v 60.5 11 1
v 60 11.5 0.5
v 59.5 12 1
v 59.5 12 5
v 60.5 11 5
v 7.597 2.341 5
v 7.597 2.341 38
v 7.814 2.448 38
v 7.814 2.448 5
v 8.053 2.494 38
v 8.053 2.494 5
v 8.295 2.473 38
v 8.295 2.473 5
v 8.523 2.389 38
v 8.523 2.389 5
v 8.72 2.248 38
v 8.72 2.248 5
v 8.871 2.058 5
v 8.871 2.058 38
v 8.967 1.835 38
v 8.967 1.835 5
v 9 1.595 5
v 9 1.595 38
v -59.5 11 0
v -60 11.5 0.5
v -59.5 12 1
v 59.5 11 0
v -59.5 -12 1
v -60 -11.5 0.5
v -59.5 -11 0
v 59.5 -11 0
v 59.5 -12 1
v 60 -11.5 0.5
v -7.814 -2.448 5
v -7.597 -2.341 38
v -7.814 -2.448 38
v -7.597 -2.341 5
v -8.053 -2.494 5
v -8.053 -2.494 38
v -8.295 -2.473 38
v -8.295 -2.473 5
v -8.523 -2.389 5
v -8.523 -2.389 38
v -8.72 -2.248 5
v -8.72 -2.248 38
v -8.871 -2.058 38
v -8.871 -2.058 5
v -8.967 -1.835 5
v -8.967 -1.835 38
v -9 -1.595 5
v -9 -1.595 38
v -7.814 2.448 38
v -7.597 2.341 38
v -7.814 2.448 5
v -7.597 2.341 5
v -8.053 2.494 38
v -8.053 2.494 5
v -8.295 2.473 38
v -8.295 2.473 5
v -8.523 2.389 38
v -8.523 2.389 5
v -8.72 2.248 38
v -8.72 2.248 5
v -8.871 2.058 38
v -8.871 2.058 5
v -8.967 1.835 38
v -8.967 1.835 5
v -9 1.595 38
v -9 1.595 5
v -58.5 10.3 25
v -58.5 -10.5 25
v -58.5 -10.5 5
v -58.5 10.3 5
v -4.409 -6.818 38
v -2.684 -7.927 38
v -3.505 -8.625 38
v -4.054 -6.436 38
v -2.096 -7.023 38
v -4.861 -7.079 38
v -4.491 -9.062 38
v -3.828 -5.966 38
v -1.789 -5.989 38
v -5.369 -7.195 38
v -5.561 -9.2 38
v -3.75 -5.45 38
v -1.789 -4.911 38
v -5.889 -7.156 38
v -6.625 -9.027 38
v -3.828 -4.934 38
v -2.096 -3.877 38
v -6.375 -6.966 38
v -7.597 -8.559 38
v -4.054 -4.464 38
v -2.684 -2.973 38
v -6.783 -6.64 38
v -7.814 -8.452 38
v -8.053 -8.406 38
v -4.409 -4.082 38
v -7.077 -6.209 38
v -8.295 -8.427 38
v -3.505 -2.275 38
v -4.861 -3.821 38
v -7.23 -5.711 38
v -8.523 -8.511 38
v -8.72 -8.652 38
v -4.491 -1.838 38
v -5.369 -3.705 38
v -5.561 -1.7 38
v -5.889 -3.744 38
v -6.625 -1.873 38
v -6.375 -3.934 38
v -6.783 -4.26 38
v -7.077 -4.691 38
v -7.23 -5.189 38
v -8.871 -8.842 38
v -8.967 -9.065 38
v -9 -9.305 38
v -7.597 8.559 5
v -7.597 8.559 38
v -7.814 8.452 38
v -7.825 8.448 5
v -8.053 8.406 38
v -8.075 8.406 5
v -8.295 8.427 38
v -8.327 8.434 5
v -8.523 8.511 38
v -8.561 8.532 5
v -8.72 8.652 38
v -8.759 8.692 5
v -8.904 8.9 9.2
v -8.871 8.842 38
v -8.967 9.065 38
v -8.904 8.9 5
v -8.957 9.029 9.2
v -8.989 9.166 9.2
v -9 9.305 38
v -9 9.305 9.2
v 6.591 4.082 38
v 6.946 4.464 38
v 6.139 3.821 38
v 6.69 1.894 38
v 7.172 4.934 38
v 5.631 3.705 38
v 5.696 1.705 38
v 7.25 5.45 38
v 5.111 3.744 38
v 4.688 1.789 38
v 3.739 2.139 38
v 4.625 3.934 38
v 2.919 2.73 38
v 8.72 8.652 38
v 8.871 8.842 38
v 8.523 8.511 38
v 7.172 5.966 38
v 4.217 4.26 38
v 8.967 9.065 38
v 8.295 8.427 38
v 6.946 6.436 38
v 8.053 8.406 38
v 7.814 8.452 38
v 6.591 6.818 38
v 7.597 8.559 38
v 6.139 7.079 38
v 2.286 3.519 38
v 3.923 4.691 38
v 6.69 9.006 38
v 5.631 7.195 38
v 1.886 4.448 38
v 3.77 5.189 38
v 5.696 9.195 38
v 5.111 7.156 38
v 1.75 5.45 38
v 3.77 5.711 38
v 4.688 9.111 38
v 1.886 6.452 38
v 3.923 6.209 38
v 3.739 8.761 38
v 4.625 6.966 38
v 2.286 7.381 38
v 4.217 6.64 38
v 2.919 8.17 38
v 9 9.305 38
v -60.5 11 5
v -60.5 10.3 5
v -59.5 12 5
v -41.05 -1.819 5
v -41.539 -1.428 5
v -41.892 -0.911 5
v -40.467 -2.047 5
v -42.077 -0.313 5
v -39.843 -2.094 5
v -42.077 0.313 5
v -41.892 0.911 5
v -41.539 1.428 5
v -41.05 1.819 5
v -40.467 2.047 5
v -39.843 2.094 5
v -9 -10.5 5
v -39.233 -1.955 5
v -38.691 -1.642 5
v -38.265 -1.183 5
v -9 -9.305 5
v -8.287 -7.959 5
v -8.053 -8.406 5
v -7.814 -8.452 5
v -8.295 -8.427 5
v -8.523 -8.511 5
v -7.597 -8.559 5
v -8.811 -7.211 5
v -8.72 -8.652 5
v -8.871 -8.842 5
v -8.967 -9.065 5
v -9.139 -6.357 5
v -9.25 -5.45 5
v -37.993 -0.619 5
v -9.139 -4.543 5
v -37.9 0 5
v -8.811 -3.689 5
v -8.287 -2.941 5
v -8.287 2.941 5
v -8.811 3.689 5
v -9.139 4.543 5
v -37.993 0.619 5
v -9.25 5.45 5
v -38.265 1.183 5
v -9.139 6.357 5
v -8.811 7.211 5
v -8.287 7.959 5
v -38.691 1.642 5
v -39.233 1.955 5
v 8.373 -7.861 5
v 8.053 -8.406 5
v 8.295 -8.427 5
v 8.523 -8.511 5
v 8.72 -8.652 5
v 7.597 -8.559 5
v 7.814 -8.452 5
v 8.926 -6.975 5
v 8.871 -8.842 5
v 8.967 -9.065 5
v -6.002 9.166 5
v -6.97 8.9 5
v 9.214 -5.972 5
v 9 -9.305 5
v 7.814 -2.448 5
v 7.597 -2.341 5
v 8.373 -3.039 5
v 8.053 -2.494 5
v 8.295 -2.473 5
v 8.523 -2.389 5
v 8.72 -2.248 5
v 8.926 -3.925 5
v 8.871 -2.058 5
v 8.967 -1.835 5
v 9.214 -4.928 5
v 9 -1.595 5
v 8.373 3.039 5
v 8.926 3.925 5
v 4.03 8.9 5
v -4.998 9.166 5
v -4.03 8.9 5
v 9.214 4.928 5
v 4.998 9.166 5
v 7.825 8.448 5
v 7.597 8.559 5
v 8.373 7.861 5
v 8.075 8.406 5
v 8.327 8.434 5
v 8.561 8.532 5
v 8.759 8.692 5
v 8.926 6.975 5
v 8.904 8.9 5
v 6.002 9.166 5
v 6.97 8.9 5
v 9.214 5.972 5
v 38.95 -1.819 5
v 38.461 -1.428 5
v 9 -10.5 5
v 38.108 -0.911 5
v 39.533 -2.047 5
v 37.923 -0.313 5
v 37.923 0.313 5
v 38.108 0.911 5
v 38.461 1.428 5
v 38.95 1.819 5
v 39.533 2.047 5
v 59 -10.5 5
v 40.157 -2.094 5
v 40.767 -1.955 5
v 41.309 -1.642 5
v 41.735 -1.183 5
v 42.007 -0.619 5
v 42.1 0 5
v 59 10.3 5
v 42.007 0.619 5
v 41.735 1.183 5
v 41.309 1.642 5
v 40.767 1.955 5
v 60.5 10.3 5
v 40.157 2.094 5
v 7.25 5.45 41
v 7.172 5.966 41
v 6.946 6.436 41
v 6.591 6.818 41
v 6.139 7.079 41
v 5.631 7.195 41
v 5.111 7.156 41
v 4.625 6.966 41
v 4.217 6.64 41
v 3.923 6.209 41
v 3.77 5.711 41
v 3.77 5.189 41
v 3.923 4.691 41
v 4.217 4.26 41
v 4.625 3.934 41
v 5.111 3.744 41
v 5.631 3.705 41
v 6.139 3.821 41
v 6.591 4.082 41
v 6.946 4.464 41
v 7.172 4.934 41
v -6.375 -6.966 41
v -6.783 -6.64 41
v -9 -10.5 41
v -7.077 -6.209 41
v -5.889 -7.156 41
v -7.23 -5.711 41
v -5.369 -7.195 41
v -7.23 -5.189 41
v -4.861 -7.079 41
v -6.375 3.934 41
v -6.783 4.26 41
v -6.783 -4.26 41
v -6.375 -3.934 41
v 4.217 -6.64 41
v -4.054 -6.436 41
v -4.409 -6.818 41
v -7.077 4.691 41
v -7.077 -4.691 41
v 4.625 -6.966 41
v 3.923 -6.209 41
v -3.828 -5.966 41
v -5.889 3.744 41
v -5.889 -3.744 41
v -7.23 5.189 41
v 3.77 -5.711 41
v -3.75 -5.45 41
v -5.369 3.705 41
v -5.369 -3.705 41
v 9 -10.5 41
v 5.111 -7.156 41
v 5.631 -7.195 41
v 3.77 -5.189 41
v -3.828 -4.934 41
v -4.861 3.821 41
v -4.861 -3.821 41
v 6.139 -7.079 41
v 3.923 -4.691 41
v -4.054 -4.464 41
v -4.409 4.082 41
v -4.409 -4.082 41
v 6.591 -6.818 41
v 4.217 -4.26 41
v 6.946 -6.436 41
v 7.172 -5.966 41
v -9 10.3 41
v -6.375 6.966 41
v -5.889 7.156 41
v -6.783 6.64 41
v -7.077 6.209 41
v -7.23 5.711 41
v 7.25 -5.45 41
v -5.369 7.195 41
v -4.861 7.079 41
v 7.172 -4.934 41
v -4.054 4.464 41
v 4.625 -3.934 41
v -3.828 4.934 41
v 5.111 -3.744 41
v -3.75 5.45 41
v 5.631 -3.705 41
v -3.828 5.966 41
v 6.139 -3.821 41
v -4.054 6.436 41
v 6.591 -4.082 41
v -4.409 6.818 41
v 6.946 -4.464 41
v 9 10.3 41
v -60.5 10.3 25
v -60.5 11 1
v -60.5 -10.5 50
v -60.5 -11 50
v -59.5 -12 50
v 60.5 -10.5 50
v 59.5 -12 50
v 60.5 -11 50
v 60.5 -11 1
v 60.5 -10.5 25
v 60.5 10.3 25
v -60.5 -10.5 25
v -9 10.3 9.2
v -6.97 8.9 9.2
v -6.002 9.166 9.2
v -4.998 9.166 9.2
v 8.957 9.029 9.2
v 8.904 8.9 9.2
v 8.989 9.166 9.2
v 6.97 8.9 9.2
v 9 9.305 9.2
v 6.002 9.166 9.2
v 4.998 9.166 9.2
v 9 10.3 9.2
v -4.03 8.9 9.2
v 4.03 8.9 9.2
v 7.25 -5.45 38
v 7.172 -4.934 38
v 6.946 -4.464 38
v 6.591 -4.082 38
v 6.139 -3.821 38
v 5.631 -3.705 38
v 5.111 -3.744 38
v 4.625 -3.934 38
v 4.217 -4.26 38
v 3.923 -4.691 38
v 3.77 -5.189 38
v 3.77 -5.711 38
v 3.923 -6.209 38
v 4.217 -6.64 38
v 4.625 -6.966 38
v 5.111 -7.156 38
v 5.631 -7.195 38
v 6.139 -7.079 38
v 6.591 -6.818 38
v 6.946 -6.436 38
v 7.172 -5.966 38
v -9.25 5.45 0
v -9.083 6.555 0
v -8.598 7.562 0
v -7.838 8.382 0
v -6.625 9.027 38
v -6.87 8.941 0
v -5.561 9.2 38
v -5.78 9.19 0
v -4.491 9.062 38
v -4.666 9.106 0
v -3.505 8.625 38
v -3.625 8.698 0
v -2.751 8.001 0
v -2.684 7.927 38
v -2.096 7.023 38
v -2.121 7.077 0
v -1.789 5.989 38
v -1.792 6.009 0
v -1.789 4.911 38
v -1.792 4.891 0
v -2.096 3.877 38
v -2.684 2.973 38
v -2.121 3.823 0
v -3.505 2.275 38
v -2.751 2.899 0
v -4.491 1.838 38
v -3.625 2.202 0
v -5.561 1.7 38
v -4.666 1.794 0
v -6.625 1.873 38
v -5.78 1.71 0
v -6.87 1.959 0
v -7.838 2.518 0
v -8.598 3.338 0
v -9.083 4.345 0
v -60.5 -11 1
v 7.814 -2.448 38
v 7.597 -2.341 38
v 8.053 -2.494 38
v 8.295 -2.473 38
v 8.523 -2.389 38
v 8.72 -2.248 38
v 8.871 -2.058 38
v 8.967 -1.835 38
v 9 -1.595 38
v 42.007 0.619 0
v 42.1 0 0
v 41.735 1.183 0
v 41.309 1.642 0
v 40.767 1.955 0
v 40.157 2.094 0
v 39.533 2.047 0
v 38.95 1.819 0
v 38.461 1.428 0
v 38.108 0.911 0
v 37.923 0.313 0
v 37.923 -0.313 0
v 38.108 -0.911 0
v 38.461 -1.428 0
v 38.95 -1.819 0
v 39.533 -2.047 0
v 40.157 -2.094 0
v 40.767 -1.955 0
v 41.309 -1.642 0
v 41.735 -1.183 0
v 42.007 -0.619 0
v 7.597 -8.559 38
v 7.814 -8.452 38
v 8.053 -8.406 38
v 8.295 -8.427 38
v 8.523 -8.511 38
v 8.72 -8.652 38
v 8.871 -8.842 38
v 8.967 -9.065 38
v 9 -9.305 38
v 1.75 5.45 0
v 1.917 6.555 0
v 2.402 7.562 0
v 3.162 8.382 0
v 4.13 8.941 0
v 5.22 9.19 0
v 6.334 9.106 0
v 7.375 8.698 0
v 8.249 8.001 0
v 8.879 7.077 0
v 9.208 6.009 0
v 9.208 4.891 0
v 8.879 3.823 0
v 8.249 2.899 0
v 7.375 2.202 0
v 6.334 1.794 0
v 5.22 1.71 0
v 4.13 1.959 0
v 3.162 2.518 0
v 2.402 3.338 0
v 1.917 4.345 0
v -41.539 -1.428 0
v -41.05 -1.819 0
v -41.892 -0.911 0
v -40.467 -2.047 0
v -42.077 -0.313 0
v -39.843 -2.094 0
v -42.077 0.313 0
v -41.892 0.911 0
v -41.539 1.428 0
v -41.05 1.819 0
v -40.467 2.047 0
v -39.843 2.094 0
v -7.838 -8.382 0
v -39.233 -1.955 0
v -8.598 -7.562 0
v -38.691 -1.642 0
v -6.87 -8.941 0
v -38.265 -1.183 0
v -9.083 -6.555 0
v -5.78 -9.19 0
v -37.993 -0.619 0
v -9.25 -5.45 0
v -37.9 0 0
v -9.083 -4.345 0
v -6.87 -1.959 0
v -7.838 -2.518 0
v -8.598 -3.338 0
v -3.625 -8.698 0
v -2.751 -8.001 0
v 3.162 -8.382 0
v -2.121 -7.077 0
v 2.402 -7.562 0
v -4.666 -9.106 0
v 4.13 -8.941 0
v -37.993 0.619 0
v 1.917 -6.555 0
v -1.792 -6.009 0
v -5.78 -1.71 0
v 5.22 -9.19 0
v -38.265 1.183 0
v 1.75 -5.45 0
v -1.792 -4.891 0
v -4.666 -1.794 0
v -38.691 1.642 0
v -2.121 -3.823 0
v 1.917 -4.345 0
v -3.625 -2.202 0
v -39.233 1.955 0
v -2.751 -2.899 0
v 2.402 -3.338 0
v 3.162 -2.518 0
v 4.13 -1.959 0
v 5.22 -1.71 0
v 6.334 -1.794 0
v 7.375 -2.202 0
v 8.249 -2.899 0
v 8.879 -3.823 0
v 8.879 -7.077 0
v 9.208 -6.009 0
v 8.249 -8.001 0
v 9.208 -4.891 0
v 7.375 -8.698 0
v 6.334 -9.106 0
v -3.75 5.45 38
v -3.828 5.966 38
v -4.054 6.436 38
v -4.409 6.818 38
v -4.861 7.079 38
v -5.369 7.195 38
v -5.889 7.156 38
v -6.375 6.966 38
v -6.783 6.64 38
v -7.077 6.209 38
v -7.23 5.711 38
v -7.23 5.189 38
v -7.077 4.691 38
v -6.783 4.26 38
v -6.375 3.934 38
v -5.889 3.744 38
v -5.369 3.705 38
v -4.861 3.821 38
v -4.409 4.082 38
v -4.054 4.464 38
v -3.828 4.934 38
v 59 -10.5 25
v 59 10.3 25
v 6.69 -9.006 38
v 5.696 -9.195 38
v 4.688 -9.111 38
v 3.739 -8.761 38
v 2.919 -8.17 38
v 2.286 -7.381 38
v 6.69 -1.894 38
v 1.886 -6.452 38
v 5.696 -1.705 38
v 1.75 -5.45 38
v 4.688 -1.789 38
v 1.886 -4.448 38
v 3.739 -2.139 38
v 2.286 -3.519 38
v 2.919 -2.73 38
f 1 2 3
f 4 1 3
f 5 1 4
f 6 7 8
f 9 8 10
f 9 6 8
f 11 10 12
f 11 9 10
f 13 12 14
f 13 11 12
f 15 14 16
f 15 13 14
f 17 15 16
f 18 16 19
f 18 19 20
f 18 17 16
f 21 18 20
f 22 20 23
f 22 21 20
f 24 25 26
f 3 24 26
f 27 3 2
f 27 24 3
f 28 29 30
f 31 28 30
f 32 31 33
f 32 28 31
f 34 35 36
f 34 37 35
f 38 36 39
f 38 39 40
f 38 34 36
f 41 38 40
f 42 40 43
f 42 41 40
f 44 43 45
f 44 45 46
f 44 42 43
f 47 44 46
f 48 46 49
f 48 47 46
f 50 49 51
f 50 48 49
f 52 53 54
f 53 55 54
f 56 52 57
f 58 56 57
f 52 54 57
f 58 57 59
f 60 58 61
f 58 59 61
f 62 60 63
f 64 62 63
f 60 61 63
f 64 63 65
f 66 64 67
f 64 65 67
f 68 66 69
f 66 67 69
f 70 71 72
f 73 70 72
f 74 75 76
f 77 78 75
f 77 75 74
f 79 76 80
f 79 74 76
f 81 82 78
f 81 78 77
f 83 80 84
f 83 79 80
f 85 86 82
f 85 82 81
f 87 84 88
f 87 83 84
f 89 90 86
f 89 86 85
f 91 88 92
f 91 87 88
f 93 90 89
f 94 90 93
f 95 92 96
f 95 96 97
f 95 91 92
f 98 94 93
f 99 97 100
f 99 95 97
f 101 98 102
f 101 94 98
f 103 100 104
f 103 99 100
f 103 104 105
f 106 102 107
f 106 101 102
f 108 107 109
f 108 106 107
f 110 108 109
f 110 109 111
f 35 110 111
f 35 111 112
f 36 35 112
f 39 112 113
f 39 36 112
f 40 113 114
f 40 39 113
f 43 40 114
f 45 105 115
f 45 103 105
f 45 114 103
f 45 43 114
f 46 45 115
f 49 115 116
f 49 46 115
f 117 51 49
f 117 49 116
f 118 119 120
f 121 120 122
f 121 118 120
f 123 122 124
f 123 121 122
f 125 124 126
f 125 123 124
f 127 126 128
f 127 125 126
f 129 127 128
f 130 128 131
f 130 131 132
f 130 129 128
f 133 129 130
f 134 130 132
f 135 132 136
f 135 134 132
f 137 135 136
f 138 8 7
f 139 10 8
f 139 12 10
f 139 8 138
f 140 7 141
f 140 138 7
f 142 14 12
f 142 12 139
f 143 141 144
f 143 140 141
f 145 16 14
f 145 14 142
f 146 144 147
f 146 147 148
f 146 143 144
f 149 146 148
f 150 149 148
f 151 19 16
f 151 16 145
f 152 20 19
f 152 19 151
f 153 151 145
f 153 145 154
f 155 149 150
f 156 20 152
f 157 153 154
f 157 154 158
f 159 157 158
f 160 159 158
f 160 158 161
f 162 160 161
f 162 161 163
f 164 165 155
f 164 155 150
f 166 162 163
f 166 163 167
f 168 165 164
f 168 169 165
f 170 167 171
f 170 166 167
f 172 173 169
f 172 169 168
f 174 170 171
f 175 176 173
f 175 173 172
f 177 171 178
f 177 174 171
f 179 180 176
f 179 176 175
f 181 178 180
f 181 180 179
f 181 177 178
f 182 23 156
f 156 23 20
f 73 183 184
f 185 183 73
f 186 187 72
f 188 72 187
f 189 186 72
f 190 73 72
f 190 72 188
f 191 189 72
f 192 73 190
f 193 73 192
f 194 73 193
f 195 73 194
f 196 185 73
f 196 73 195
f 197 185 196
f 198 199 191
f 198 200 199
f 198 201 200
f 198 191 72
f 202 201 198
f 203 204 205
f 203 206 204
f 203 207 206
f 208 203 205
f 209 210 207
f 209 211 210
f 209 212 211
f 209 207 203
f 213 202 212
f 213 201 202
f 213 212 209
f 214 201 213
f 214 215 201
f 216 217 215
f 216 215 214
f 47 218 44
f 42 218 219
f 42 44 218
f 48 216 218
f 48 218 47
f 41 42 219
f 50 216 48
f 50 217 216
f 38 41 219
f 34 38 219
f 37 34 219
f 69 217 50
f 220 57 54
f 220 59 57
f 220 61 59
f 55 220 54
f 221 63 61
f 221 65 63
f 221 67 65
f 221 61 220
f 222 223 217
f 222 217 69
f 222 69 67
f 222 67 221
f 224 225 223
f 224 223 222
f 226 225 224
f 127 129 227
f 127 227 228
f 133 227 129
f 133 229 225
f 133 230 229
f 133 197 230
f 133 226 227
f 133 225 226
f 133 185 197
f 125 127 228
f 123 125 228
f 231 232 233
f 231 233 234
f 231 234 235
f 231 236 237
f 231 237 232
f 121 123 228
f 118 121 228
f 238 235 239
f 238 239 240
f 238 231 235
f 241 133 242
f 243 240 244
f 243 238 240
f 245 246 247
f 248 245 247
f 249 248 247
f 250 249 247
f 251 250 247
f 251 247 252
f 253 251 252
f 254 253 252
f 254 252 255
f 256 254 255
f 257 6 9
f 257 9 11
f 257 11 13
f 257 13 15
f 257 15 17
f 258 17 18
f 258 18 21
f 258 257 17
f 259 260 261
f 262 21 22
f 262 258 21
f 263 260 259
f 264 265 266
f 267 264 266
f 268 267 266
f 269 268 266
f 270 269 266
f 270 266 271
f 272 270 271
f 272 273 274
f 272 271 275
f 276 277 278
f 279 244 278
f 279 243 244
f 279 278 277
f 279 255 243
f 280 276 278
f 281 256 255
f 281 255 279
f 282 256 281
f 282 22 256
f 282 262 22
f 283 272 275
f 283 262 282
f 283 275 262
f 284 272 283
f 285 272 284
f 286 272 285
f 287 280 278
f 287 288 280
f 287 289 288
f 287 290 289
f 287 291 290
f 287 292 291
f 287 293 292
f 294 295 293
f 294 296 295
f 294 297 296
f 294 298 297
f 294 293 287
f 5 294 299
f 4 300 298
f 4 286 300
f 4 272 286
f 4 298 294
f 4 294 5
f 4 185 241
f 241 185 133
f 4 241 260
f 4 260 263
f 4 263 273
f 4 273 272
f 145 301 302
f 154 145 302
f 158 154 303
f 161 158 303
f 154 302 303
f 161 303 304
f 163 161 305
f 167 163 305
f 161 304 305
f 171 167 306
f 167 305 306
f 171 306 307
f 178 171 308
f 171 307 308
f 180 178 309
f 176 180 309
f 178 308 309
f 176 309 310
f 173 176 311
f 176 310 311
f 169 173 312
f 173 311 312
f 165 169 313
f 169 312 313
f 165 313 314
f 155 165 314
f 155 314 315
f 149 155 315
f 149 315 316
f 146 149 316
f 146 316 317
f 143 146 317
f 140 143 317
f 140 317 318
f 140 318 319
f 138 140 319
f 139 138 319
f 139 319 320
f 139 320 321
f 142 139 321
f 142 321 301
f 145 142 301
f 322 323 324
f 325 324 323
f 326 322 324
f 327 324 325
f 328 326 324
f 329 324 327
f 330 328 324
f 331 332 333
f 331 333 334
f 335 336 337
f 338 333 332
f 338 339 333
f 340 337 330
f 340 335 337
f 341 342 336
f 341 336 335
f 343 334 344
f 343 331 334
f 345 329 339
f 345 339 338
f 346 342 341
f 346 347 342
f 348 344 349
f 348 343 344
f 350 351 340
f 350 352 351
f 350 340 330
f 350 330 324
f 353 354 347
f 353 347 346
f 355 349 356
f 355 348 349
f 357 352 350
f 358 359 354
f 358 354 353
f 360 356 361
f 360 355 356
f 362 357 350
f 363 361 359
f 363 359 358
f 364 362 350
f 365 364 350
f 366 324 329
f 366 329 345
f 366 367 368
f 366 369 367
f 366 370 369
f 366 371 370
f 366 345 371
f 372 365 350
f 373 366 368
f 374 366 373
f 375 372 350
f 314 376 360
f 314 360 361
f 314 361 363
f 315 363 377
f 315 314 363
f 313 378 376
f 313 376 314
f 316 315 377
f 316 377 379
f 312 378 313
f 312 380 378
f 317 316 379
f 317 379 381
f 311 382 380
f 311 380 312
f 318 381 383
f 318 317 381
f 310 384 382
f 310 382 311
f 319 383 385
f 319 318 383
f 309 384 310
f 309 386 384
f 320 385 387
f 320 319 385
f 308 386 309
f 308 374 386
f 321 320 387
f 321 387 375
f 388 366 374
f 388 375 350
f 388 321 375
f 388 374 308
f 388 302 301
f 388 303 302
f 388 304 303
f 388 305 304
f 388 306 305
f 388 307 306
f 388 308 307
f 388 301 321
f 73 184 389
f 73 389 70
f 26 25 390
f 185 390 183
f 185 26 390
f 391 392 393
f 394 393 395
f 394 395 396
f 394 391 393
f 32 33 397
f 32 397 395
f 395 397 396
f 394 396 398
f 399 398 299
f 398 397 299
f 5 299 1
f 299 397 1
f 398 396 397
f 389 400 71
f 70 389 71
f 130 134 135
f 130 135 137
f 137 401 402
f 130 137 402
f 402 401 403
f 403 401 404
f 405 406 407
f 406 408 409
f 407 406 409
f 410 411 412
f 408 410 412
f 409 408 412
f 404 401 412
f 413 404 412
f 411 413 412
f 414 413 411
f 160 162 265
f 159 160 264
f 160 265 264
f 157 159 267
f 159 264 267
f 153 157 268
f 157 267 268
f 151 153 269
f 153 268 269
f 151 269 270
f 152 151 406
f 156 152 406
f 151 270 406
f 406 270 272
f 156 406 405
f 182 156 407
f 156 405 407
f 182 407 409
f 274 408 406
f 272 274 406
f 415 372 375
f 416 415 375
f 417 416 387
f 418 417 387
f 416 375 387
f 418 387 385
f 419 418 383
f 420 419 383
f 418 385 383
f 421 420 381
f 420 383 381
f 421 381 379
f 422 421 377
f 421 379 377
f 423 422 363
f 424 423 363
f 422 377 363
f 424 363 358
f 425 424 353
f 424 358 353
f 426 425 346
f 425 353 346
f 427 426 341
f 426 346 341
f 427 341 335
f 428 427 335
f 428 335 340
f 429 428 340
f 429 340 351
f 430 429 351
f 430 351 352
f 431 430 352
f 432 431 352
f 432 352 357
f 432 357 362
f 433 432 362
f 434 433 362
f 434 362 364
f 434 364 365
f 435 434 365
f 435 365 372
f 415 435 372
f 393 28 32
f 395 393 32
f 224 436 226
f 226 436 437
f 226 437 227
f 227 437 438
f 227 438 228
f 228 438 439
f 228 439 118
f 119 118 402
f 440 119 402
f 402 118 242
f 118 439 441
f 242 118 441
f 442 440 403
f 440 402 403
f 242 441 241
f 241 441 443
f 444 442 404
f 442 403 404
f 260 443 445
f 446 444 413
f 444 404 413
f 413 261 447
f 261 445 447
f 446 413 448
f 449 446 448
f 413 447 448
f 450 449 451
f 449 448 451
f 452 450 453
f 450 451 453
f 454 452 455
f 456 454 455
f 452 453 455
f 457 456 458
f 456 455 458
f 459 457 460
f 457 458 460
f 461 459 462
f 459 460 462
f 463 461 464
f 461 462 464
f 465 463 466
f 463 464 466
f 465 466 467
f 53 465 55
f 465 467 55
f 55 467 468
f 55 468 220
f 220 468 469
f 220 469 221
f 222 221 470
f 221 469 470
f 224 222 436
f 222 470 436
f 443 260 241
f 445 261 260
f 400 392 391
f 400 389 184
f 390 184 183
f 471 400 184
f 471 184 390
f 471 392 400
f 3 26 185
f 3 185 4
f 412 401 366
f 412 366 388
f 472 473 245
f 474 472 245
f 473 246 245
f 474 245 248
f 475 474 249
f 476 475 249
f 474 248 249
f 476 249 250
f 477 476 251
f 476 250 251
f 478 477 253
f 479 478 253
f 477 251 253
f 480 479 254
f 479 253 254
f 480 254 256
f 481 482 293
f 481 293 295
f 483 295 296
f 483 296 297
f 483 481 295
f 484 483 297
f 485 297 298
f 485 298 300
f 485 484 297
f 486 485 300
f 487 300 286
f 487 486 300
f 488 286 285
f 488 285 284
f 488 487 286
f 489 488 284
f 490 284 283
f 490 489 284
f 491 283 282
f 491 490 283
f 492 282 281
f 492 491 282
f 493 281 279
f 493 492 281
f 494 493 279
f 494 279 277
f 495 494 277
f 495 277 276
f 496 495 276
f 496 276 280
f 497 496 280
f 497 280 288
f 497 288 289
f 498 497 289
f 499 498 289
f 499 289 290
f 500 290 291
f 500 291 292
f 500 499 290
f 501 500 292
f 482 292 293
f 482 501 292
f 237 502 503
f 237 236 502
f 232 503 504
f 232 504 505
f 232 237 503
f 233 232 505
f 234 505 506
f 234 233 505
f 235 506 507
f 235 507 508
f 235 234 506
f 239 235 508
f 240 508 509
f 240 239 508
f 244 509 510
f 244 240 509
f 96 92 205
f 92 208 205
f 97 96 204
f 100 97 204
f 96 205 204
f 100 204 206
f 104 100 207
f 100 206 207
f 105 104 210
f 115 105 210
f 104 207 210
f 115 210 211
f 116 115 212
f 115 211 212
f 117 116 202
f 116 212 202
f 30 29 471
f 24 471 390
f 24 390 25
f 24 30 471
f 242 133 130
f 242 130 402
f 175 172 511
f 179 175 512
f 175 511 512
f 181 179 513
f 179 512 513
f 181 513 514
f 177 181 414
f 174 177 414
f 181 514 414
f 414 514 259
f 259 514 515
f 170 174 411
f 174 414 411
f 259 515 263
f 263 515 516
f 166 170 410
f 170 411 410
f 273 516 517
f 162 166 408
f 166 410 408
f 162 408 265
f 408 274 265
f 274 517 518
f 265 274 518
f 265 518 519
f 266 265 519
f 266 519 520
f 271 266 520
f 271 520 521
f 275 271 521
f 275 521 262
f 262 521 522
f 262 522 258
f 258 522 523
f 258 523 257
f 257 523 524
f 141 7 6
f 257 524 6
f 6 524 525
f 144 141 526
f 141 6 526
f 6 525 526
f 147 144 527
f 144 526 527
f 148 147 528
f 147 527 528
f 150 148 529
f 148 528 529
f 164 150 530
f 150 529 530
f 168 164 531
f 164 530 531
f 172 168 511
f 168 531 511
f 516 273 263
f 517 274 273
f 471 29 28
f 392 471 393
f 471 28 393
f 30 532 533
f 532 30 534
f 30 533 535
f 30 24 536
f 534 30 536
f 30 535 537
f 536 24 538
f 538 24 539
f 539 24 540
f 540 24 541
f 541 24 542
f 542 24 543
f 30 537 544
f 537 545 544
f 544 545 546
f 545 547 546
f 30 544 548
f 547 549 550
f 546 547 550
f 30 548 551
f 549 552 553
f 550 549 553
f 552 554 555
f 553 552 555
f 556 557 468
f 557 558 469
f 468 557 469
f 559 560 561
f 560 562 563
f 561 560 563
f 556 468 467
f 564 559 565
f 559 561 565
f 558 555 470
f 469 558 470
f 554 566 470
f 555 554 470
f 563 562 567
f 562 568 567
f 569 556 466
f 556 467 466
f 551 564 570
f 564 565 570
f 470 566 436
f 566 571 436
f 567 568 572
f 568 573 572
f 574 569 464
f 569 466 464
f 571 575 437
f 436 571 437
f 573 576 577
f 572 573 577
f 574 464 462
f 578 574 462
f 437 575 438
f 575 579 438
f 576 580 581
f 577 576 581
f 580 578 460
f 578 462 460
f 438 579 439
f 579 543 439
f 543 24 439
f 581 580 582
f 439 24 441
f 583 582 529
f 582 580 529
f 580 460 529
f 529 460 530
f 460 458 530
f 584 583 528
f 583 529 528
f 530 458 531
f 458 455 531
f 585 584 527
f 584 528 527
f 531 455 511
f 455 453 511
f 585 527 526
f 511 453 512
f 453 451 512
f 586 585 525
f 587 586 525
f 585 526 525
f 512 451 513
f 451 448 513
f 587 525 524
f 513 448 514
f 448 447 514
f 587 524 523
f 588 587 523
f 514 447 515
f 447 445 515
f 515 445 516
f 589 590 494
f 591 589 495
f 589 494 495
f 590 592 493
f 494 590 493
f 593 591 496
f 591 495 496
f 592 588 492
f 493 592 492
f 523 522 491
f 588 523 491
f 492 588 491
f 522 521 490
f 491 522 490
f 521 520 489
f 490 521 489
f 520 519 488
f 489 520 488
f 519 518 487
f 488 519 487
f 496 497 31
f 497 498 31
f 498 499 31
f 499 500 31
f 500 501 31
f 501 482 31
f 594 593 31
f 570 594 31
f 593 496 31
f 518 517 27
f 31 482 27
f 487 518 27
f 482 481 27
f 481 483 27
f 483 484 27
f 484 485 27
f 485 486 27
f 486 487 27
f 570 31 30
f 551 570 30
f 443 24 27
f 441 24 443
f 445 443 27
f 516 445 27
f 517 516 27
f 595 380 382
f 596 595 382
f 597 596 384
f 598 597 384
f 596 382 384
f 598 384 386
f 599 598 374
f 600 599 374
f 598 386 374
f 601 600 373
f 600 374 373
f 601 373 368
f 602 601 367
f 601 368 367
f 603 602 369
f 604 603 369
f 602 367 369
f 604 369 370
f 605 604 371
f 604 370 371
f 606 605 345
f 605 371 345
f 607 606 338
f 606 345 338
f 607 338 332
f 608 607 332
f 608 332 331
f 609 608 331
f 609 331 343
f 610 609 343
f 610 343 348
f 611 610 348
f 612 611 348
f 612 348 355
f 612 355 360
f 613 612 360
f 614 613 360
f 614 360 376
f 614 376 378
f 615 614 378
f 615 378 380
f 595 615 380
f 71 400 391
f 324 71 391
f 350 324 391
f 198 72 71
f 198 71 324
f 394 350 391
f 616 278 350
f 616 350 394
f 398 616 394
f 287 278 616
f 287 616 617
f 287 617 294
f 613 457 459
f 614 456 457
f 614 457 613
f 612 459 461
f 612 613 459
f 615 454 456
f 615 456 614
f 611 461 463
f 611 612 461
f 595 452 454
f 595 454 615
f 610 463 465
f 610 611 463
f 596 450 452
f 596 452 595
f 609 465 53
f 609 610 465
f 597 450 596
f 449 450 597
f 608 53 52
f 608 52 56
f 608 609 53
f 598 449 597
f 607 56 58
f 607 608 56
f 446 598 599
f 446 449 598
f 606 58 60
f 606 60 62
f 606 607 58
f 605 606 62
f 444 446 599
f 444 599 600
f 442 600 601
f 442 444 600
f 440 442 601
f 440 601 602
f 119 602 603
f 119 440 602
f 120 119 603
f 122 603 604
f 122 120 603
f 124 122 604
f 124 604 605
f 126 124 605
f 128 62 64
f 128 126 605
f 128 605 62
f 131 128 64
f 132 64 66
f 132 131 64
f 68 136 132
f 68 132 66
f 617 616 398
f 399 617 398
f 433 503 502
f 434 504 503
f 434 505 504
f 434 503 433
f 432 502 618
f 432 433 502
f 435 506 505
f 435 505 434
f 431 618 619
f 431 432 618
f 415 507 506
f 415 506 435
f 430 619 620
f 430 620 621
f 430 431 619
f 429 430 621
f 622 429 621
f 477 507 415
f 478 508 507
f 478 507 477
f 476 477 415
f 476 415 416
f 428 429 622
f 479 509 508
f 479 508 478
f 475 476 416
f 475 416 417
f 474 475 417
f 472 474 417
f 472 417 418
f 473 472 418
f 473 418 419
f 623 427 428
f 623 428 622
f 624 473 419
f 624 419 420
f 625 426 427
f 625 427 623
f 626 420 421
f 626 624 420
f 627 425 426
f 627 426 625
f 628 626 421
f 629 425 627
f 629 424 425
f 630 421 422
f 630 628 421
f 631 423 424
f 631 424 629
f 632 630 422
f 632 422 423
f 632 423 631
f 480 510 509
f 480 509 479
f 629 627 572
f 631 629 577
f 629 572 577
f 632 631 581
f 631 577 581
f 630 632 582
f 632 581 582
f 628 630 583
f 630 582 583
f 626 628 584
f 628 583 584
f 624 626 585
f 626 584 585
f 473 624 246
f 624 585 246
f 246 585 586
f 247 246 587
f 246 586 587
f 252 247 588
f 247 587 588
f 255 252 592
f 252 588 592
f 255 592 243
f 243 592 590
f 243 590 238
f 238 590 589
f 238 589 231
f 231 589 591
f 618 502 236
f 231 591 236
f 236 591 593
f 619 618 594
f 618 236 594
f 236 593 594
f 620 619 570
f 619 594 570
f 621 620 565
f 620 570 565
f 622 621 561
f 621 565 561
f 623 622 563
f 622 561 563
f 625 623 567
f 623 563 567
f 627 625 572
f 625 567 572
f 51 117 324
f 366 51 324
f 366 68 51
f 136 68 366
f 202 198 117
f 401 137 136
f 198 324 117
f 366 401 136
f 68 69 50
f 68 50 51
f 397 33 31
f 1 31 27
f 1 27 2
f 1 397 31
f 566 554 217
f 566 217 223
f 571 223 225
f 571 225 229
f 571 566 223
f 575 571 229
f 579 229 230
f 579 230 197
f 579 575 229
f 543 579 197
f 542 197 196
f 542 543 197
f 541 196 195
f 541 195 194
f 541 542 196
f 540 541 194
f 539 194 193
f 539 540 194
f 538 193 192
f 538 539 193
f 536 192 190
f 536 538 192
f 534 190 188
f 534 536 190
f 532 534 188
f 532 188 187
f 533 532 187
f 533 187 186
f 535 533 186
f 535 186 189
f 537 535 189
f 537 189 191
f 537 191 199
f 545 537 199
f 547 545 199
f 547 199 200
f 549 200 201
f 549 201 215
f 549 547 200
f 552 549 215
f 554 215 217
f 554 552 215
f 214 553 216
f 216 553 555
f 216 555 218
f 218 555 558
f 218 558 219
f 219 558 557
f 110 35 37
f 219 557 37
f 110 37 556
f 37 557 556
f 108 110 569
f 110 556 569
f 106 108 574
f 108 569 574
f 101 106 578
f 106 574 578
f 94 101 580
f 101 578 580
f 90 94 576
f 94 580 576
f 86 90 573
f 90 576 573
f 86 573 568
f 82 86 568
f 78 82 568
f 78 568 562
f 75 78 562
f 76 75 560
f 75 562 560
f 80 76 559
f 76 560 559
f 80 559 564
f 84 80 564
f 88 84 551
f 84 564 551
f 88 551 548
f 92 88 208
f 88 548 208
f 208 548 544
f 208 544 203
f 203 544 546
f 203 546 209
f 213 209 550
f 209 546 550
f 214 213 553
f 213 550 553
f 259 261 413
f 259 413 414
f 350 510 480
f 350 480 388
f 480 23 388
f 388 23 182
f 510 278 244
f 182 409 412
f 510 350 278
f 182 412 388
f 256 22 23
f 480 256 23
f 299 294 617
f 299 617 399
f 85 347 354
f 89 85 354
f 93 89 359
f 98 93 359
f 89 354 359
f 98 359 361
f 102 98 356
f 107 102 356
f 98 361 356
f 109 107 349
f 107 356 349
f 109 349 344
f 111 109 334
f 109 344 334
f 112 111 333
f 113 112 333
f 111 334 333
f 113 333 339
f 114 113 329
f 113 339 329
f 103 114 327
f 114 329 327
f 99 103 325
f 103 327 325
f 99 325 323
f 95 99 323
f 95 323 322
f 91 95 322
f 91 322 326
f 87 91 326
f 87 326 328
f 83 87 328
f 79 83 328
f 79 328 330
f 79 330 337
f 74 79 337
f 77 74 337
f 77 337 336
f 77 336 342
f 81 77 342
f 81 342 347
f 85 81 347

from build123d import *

# Parameters (mm, degrees)
SZKIC1_W                    = 121
SZKIC1_H                    = 24
SZKIC1_R                    = 2.1
DODANIE_WYCI_GNI_CIE1_DEPTH = 5
SZKIC2_W                    = 18
SZKIC2_H                    = 21
DODANIE_WYCI_GNI_CIE2_DEPTH = 36
WYTNIJ_WYCI_GNI_CIE1_REACH  = 76.062
SZKIC3_R                    = 1.75
SZKIC4_R                    = 3.75
WYTNIJ_WYCI_GNI_CIE2_DEPTH  = 38
ZAOKR_GLENIE1_R             = 0.9
SZKIC5_W                    = 121
SZKIC5_H                    = 1.5
DODANIE_WYCI_GNI_CIE3_DEPTH = 45
SZKIC6_W                    = 18
SZKIC6_H                    = 36
WYTNIJ_WYCI_GNI_CIE3_DEPTH  = 0.2
SZKIC7_W                    = 18
SZKIC7_H                    = 4.2
WYTNIJ_WYCI_GNI_CIE4_DEPTH  = 1.4
SZKIC8_W                    = 2
SZKIC8_H                    = 20
SZKIC8_W_2                  = 1.5
DODANIE_WYCI_GNI_CIE4_DEPTH = 20.8
SFAZOWANIE1_SIZE            = 1
SFAZOWANIE2_SIZE            = 1


with BuildPart() as part:
    # Szkic1 → Dodanie-wyciągnięcie1 (new body)
    with BuildSketch(Plane.XY):
        Rectangle(SZKIC1_W, SZKIC1_H)
        with Locations((-40, 0)):
            Circle(SZKIC1_R, mode=Mode.SUBTRACT)
        with Locations((40, 0)):
            Circle(SZKIC1_R, mode=Mode.SUBTRACT)
    extrude(amount=DODANIE_WYCI_GNI_CIE1_DEPTH)

    # Szkic2 → Dodanie-wyciągnięcie2 (add)
    with BuildSketch(Plane.XY.offset(5)):
        Rectangle(SZKIC2_W, SZKIC2_H)
    extrude(amount=DODANIE_WYCI_GNI_CIE2_DEPTH)

    # Szkic3 → Wytnij-wyciągnięcie1 (cut, up to next)
    with BuildSketch(Plane.XY.offset(41), mode=Mode.PRIVATE) as wytnij_wyci_gni_cie1_sk1:
        with Locations((-5.5, 5.45)):
            Circle(SZKIC3_R)
    wytnij_wyci_gni_cie1_tool1 = extrude(wytnij_wyci_gni_cie1_sk1.sketch, amount=-WYTNIJ_WYCI_GNI_CIE1_REACH, mode=Mode.PRIVATE) & part.part
    # Szkic3 → Wytnij-wyciągnięcie1 (cut, up to next)
    with BuildSketch(Plane.XY.offset(41), mode=Mode.PRIVATE) as wytnij_wyci_gni_cie1_sk2:
        with Locations((-5.5, -5.45)):
            Circle(SZKIC3_R)
    wytnij_wyci_gni_cie1_tool2 = extrude(wytnij_wyci_gni_cie1_sk2.sketch, amount=-WYTNIJ_WYCI_GNI_CIE1_REACH, mode=Mode.PRIVATE) & part.part
    # Szkic3 → Wytnij-wyciągnięcie1 (cut, up to next)
    with BuildSketch(Plane.XY.offset(41), mode=Mode.PRIVATE) as wytnij_wyci_gni_cie1_sk3:
        with Locations((5.5, -5.45)):
            Circle(SZKIC3_R)
    wytnij_wyci_gni_cie1_tool3 = extrude(wytnij_wyci_gni_cie1_sk3.sketch, amount=-WYTNIJ_WYCI_GNI_CIE1_REACH, mode=Mode.PRIVATE) & part.part
    # Szkic3 → Wytnij-wyciągnięcie1 (cut, up to next)
    with BuildSketch(Plane.XY.offset(41), mode=Mode.PRIVATE) as wytnij_wyci_gni_cie1_sk4:
        with Locations((5.5, 5.45)):
            Circle(SZKIC3_R)
    wytnij_wyci_gni_cie1_tool4 = extrude(wytnij_wyci_gni_cie1_sk4.sketch, amount=-WYTNIJ_WYCI_GNI_CIE1_REACH, mode=Mode.PRIVATE) & part.part
    add(wytnij_wyci_gni_cie1_tool1.solids().sort_by_distance((-5.5, 5.45, 41))[0], mode=Mode.SUBTRACT)
    add(wytnij_wyci_gni_cie1_tool2.solids().sort_by_distance((-5.5, -5.45, 41))[0], mode=Mode.SUBTRACT)
    add(wytnij_wyci_gni_cie1_tool3.solids().sort_by_distance((5.5, -5.45, 41))[0], mode=Mode.SUBTRACT)
    add(wytnij_wyci_gni_cie1_tool4.solids().sort_by_distance((5.5, 5.45, 41))[0], mode=Mode.SUBTRACT)

    # Szkic4 → Wytnij-wyciągnięcie2 (cut)
    with BuildSketch(Plane(origin=(0, 0, 0), x_dir=(-1, 0, 0), z_dir=(0, 0, -1))):
        with Locations((-5.5, 5.45)):
            Circle(SZKIC4_R)
        with Locations((-5.5, -5.45)):
            Circle(SZKIC4_R)
        with Locations((5.5, 5.45)):
            Circle(SZKIC4_R)
        with Locations((5.5, -5.45)):
            Circle(SZKIC4_R)
    extrude(amount=-WYTNIJ_WYCI_GNI_CIE2_DEPTH, mode=Mode.SUBTRACT)

    # Zaokrąglenie1
    zaokr_glenie1_edges = [part.edges().sort_by_distance(p)[0] for p in [
        (-9, -4.103708798, 21.5),
        (-9, -6.796291202, 21.5),
        (-9, 6.796291202, 21.5),
        (-9, 4.103708798, 21.5),
        (9, 4.103708798, 21.5),
        (9, 6.796291202, 21.5),
        (9, -6.796291202, 21.5),
        (9, -4.103708798, 21.5),
    ]]
    fillet(zaokr_glenie1_edges, radius=ZAOKR_GLENIE1_R)

    # Szkic5 → Dodanie-wyciągnięcie3 (add)
    with BuildSketch(Plane.XY.offset(5)):
        with Locations((0, -11.25)):
            Rectangle(SZKIC5_W, SZKIC5_H)
    extrude(amount=DODANIE_WYCI_GNI_CIE3_DEPTH)

    # Szkic6 → Wytnij-wyciągnięcie3 (cut)
    with BuildSketch(Plane(origin=(0, 10.5, 0), x_dir=(1, 0, 0), z_dir=(0, 1, 0))):
        with Locations((0, -23)):
            Rectangle(SZKIC6_W, SZKIC6_H)
    extrude(amount=-WYTNIJ_WYCI_GNI_CIE3_DEPTH, mode=Mode.SUBTRACT)

    # Szkic7 → Wytnij-wyciągnięcie4 (cut)
    with BuildSketch(Plane(origin=(0, 10.3, 0), x_dir=(1, 0, 0), z_dir=(0, 1, 0))):
        with Locations((0, -7.1)):
            Rectangle(SZKIC7_W, SZKIC7_H)
    extrude(amount=-WYTNIJ_WYCI_GNI_CIE4_DEPTH, mode=Mode.SUBTRACT)

    # Szkic8 → Dodanie-wyciągnięcie4 (add)
    with BuildSketch(Plane(origin=(0, -10.5, 0), x_dir=(1, 0, 0), z_dir=(0, 1, 0))):
        with Locations((-59.5, -15)):
            Rectangle(SZKIC8_W, SZKIC8_H)
        with Locations((59.75, -15)):
            Rectangle(SZKIC8_W_2, SZKIC8_H)
    extrude(amount=DODANIE_WYCI_GNI_CIE4_DEPTH)

    # Sfazowanie1
    sfazowanie1_edges = [part.edges().sort_by_distance(p)[0] for p in [
        (0, -12, 0),
        (-60.5, 0, 0),
        (0, 12, 0),
        (60.5, 0, 0),
    ]]
    chamfer(sfazowanie1_edges, length=SFAZOWANIE1_SIZE)

    # Sfazowanie2
    sfazowanie2_edges = [part.edges().sort_by_distance(p)[0] for p in [
        (60.5, -12, 25.5),
        (-60.5, -12, 25.5),
        (-60.5, 12, 3),
        (60.5, 12, 3),
    ]]
    chamfer(sfazowanie2_edges, length=SFAZOWANIE2_SIZE)


solid = part.part
